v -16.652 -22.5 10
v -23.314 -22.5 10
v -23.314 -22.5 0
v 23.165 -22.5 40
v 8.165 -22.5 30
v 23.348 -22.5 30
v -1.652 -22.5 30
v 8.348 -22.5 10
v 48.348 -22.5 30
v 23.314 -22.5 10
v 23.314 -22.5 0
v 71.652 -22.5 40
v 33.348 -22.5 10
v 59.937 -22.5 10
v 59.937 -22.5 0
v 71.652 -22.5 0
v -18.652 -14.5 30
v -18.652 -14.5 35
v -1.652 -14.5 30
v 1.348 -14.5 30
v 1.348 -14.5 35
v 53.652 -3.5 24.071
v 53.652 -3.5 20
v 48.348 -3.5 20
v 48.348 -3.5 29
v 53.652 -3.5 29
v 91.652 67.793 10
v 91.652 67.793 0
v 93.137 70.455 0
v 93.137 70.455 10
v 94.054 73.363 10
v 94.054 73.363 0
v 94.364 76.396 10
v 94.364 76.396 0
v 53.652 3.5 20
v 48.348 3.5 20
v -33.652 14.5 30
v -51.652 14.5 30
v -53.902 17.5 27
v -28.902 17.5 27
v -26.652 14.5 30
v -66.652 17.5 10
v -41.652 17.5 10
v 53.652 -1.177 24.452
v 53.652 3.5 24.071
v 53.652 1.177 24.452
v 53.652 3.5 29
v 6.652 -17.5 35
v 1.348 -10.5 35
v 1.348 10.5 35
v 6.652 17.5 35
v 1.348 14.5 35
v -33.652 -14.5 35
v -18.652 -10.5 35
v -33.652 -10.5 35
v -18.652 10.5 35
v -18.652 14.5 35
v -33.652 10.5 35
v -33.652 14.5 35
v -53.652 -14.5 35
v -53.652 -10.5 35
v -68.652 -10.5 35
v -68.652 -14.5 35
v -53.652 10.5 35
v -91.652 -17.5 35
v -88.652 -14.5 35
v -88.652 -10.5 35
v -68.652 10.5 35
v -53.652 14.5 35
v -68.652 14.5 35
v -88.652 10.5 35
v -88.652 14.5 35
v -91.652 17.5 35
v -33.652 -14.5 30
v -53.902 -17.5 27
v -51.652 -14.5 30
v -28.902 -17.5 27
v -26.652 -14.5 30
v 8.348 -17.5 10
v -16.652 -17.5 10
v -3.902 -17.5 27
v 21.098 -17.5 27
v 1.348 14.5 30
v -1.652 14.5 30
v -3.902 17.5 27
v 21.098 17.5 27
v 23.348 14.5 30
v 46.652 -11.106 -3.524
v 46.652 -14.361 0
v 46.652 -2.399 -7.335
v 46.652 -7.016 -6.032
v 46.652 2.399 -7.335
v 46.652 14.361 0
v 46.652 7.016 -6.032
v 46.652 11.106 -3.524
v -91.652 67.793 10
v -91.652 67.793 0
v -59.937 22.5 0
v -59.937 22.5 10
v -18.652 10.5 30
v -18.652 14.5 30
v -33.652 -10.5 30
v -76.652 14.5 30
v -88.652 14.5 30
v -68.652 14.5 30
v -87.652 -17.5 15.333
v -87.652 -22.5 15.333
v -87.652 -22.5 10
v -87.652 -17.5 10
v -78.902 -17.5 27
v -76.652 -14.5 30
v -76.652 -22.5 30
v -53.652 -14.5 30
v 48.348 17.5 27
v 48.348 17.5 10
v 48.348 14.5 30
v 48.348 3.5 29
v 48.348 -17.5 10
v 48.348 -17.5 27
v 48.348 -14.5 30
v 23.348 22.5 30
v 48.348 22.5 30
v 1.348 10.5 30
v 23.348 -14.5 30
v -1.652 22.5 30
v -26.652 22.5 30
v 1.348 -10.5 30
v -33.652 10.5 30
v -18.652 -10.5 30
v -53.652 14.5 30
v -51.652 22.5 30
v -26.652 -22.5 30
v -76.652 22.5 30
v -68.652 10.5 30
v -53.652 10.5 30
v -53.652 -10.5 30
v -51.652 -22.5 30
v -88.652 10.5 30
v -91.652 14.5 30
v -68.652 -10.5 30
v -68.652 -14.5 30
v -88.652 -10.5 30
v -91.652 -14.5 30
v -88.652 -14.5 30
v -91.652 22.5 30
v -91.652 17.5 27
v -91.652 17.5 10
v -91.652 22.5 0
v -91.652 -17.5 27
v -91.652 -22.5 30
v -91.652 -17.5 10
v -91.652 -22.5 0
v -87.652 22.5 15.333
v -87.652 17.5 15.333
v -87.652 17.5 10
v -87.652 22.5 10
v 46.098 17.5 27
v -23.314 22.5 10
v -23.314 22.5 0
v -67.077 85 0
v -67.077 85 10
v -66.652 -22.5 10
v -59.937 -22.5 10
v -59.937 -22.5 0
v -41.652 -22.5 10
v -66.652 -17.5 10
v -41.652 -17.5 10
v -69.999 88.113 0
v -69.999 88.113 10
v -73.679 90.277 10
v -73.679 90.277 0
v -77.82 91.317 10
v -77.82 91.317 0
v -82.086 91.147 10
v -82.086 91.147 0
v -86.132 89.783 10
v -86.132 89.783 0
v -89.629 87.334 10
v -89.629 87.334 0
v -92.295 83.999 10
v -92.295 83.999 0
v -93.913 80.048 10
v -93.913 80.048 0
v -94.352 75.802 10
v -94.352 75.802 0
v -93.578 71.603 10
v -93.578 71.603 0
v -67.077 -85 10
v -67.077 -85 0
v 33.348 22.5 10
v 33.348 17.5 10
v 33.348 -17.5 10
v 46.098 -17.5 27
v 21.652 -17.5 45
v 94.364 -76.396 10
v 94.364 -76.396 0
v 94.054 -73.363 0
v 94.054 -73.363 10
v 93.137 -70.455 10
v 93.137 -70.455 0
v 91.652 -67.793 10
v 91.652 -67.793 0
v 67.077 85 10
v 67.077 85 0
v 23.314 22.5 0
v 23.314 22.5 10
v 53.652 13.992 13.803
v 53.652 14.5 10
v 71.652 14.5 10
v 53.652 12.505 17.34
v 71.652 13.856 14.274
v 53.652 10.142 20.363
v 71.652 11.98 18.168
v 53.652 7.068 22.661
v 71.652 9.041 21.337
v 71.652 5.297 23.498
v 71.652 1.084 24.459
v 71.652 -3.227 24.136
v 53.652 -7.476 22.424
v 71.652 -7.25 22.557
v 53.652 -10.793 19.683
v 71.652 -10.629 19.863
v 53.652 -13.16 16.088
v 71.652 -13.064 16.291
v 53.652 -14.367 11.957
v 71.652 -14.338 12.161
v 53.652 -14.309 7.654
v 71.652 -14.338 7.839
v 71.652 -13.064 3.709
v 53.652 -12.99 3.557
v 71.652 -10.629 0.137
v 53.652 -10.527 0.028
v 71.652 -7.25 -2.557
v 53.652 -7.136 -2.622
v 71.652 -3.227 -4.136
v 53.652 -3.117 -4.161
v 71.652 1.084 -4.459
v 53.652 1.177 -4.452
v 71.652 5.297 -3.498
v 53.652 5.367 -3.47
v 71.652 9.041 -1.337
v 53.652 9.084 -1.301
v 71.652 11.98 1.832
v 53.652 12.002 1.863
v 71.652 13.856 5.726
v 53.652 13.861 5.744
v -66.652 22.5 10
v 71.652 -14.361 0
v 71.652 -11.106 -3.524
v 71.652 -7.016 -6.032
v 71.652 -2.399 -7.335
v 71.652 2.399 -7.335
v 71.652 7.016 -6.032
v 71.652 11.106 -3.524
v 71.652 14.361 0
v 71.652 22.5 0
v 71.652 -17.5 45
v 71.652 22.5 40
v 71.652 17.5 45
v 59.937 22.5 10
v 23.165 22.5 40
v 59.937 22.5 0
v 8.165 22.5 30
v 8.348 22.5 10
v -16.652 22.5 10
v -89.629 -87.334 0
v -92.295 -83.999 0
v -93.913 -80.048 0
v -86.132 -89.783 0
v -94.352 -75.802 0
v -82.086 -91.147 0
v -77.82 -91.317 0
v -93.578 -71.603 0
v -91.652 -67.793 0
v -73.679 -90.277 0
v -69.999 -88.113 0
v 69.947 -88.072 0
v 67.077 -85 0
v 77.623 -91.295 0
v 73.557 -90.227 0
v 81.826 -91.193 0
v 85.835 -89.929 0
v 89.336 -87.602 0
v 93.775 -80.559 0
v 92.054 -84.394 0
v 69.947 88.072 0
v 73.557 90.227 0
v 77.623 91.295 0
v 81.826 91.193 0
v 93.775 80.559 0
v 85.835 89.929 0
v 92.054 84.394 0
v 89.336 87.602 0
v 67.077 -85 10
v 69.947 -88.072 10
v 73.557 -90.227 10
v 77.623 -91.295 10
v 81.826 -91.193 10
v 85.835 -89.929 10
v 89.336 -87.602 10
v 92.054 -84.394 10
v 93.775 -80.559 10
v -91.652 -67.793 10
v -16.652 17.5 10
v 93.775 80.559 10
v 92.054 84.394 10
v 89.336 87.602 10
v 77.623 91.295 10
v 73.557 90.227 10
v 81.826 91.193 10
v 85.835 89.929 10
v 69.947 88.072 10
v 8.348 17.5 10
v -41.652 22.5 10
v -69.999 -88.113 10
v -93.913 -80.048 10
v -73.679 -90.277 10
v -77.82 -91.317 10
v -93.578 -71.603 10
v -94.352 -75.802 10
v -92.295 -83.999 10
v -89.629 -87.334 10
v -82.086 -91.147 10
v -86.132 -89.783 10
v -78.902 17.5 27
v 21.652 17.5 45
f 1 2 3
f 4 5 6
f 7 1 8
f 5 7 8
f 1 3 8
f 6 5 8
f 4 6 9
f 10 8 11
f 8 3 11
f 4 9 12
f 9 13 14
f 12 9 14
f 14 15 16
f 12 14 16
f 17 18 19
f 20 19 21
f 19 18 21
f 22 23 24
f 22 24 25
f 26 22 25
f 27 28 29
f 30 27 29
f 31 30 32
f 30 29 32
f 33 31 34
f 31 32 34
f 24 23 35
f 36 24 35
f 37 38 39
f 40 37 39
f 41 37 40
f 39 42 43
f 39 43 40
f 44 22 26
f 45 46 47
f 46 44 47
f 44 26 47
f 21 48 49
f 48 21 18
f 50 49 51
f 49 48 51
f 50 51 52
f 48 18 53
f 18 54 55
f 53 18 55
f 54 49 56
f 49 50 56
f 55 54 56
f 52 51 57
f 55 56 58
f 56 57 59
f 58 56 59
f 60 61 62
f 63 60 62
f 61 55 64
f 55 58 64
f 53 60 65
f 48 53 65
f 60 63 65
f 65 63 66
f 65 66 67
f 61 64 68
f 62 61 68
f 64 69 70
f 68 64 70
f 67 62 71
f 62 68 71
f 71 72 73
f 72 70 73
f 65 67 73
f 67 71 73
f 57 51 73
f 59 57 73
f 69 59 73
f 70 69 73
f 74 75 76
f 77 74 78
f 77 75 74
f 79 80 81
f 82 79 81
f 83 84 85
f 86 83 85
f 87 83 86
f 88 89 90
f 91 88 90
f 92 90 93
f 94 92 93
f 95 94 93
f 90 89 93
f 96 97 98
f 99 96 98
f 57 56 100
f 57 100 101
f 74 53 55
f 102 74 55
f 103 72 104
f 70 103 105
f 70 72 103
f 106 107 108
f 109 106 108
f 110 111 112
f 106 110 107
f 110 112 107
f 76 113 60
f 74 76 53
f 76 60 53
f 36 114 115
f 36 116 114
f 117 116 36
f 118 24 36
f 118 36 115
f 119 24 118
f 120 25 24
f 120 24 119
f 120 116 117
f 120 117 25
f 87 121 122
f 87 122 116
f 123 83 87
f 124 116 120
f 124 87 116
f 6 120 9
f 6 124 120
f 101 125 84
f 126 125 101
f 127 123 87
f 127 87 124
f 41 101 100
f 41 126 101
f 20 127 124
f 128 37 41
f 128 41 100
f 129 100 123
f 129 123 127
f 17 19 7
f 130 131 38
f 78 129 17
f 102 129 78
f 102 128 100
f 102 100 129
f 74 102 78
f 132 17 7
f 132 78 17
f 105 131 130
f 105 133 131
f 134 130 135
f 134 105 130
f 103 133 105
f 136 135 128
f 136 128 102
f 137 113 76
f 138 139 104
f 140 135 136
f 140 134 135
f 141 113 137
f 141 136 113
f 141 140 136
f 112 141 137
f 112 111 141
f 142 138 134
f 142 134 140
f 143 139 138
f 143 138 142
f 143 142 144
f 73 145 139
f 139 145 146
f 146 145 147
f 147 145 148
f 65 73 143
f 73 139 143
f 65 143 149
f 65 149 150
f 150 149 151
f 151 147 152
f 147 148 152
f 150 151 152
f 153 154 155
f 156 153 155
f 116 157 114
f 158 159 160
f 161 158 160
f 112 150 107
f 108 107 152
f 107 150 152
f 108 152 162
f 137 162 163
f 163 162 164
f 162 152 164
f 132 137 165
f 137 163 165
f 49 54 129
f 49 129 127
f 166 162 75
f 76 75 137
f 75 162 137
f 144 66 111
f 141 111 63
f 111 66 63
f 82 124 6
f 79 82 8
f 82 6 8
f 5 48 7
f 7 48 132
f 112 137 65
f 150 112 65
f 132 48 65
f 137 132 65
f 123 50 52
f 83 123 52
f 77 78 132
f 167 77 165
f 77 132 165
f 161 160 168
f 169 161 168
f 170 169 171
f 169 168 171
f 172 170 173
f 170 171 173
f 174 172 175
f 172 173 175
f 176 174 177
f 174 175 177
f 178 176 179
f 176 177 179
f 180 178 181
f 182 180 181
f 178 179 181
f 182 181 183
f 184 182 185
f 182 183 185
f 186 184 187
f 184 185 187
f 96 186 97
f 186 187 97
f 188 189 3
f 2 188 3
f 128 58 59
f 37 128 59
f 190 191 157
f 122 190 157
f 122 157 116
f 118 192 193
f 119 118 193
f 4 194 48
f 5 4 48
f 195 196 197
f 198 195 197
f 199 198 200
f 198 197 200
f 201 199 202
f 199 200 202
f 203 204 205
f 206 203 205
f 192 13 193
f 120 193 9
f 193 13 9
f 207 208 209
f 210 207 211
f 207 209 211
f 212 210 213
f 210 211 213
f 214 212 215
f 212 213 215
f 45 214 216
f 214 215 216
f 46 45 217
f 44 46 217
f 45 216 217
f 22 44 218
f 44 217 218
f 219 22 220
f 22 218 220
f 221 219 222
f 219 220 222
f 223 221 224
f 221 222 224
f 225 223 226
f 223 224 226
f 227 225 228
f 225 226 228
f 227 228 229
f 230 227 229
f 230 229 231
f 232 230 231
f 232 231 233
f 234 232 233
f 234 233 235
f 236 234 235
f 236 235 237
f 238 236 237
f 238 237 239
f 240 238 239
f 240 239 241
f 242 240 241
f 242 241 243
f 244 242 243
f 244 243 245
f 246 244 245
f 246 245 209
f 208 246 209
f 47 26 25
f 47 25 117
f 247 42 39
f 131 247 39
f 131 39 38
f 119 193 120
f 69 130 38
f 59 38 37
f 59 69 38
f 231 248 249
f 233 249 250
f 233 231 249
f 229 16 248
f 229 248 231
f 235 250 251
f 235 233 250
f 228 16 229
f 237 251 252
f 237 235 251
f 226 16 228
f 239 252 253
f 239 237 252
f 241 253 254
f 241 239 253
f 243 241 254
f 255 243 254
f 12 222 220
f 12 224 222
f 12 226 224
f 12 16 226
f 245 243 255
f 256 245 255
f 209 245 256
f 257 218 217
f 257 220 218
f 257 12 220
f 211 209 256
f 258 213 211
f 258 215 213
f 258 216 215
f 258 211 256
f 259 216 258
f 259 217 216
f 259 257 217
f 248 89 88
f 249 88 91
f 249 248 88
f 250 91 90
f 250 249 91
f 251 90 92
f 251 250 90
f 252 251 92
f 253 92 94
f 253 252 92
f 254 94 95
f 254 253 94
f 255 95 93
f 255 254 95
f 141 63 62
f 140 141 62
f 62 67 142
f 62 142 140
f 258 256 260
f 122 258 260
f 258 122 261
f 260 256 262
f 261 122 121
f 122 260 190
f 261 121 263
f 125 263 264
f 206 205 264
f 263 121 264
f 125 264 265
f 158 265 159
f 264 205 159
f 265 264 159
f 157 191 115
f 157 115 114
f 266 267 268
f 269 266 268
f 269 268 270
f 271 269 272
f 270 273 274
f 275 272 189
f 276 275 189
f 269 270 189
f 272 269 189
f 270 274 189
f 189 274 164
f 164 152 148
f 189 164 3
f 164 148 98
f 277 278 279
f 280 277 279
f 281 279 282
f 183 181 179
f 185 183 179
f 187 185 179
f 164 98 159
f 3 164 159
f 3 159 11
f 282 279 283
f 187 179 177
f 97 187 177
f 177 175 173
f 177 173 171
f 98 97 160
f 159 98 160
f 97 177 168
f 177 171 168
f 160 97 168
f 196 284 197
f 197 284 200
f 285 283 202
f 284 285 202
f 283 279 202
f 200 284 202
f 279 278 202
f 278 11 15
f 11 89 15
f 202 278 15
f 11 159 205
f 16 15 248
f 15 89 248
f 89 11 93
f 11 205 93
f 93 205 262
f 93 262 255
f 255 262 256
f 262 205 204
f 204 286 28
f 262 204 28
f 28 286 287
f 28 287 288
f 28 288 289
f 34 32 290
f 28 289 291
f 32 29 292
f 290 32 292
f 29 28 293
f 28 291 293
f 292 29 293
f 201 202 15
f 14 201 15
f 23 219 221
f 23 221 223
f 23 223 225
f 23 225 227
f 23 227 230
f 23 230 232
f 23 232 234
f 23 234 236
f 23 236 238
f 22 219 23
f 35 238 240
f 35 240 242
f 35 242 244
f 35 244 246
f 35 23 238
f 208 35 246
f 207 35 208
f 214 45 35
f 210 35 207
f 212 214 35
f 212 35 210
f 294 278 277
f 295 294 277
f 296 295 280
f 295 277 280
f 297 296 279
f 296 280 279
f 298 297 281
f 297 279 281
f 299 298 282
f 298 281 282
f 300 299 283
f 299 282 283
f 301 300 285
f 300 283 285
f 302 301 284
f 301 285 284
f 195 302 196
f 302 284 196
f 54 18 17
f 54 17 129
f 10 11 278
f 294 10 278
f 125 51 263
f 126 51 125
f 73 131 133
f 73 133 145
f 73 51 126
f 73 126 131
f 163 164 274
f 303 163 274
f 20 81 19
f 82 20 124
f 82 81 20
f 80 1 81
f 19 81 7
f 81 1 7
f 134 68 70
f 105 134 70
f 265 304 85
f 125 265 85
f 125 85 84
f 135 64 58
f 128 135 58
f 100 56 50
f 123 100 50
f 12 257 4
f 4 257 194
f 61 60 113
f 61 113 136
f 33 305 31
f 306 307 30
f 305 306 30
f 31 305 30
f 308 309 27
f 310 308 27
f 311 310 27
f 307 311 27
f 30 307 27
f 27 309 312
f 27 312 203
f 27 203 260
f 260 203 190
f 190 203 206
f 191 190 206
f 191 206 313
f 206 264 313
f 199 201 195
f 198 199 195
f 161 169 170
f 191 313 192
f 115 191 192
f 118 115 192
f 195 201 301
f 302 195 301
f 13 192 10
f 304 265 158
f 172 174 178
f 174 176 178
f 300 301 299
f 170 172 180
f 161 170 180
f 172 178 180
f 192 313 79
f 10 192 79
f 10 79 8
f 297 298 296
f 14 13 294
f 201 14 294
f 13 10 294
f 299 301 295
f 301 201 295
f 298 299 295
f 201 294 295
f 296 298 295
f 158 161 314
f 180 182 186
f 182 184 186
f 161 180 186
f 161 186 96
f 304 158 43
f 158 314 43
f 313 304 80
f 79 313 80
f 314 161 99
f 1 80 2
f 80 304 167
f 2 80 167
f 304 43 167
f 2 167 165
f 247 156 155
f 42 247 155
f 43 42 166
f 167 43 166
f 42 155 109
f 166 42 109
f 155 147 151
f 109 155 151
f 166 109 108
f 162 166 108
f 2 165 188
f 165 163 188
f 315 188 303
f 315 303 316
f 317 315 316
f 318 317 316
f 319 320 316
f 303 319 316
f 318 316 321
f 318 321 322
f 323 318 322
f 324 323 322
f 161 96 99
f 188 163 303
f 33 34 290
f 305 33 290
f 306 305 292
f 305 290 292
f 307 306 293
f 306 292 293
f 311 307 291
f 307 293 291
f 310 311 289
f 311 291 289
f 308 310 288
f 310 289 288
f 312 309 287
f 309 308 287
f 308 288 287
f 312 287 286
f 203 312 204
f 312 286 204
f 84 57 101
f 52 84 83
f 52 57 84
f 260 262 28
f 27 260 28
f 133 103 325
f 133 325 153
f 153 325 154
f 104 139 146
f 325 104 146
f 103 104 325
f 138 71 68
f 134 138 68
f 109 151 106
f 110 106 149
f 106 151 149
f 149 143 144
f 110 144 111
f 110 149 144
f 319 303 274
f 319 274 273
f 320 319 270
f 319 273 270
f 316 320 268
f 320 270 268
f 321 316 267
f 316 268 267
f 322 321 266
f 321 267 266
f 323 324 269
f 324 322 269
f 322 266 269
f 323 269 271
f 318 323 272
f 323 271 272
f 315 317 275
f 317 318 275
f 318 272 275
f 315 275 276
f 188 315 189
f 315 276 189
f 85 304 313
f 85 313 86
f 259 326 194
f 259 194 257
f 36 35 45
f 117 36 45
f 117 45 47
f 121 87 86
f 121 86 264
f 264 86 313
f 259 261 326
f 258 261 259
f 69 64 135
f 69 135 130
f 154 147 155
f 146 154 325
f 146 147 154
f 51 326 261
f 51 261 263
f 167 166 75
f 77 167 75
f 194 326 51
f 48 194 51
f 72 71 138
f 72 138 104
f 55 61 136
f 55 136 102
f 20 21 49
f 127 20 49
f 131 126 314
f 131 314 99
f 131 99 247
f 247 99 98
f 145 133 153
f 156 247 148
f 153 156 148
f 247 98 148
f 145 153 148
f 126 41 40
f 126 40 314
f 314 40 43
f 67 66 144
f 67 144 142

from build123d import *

# Parameters (mm, degrees)
F1_DEPTH  = 45
F2_W      = 216.5675759315
F2_H      = 199.976965785
F2_W_2    = 183.3030277982
F2_H_2    = 45
F3_DEPTH  = 35
F4_W      = 45
F4_H      = 45
F5_DEPTH  = 20
F6_R      = 17.5
F7_DEPTH  = 25
F8_R      = 14.5
F9_DEPTH  = 18
F10_W     = 7
F10_H     = 9
F11_DEPTH = 10
F12_W     = 35
F12_H     = 20
F13_DEPTH = 140
F15_DEPTH = 113.8973534547
F16_SIZE  = 5
F17_SIZE  = 3
F18_W     = 20
F18_H     = 4
F19_DEPTH = 10
F21_DEPTH = 113.8973534547


with BuildPart() as f1:
    # F0 (on Top) → F1 (new body)
    with BuildSketch(Plane.XY):
        Polygon((-91.6515138991, 22.5), (-91.6515138991, -22.5), (-59.9372190952, -22.5), (-23.3139814323, -22.5), (23.3139814323, -22.5), (59.9372190952, -22.5), (91.6515138991, -22.5), (91.6515138991, 22.5), (59.9372190952, 22.5), (23.3139814323, 22.5), (-23.3139814323, 22.5), (-59.9372190952, 22.5), align=None)
        with BuildLine():
            Line((-23.3139814323, -22.5), (-59.9372190952, -22.5))
            Line((-59.9372190952, -22.5), (-91.6515138991, -67.7927069095))
            ThreePointArc((-91.6515138991, -67.7927069095), (-74.8536462422, -62.0905991935), (-64.3642332348, -76.3963534547))
            ThreePointArc((-64.3642332348, -76.3963534547), (-65.0584789736, -80.9069404473), (-67.0769525704, -85))
            Line((-67.0769525704, -85), (-23.3139814323, -22.5))
        make_face()
        with BuildLine():
            ThreePointArc((-64.3642332348, -76.3963534547), (-74.8536462422, -62.0905991935), (-91.6515138991, -67.7927069095))
            Line((-91.6515138991, -67.7927069095), (-67.0769525704, -85))
            ThreePointArc((-67.0769525704, -85), (-65.0584789736, -80.9069404473), (-64.3642332348, -76.3963534547))
        make_face()
        with BuildLine():
            Line((-67.0769525704, -85), (-91.6515138991, -67.7927069095))
            ThreePointArc((-91.6515138991, -67.7927069095), (-87.96787978, -88.6836341191), (-67.0769525704, -85))
        make_face()
        with BuildLine():
            Line((-91.6515138991, 67.7927069095), (-59.9372190952, 22.5))
            Line((-59.9372190952, 22.5), (-23.3139814323, 22.5))
            Line((-23.3139814323, 22.5), (-67.0769525704, 85))
            ThreePointArc((-67.0769525704, 85), (-65.0584789736, 80.9069404473), (-64.3642332348, 76.3963534547))
            ThreePointArc((-64.3642332348, 76.3963534547), (-74.8536462422, 62.0905991935), (-91.6515138991, 67.7927069095))
        make_face()
        with BuildLine():
            Line((59.9372190952, -22.5), (23.3139814323, -22.5))
            Line((23.3139814323, -22.5), (67.0769525704, -85))
            ThreePointArc((67.0769525704, -85), (70.7605866895, -64.1090727904), (91.6515138991, -67.7927069095))
            Line((91.6515138991, -67.7927069095), (59.9372190952, -22.5))
        make_face()
        with BuildLine():
            ThreePointArc((-67.0769525704, 85), (-87.96787978, 88.6836341191), (-91.6515138991, 67.7927069095))
            ThreePointArc((-91.6515138991, 67.7927069095), (-74.8536462422, 62.0905991935), (-64.3642332348, 76.3963534547))
            ThreePointArc((-64.3642332348, 76.3963534547), (-65.0584789736, 80.9069404473), (-67.0769525704, 85))
        make_face()
        with BuildLine():
            ThreePointArc((91.6515138991, -67.7927069095), (70.7605866895, -64.1090727904), (67.0769525704, -85))
            ThreePointArc((67.0769525704, -85), (83.8748202273, -90.702107716), (94.3642332348, -76.3963534547))
            ThreePointArc((94.3642332348, -76.3963534547), (93.669987496, -71.8857664622), (91.6515138991, -67.7927069095))
        make_face()
        with BuildLine():
            Line((67.0769525704, 85), (23.3139814323, 22.5))
            Line((23.3139814323, 22.5), (59.9372190952, 22.5))
            Line((59.9372190952, 22.5), (91.6515138991, 67.7927069095))
            ThreePointArc((91.6515138991, 67.7927069095), (70.7605866895, 64.1090727904), (67.0769525704, 85))
        make_face()
        with BuildLine():
            ThreePointArc((94.3642332348, 76.3963534547), (83.8748202273, 90.702107716), (67.0769525704, 85))
            ThreePointArc((67.0769525704, 85), (70.7605866895, 64.1090727904), (91.6515138991, 67.7927069095))
            ThreePointArc((91.6515138991, 67.7927069095), (93.669987496, 71.8857664622), (94.3642332348, 76.3963534547))
        make_face()
    extrude(amount=F1_DEPTH)

    # F2 (on face) → F3 (cut)
    with BuildSketch(Plane.XY.offset(45)):
        Rectangle(F2_W, F2_H)
        Rectangle(F2_W_2, F2_H_2, mode=Mode.SUBTRACT)
    extrude(amount=-F3_DEPTH, mode=Mode.SUBTRACT)

    # F4 (on face) → F5 (cut)
    with BuildSketch(Plane.YZ.offset(91.6515138991)):
        with Locations((0, 22.5)):
            Rectangle(F4_W, F4_H)
    extrude(amount=-F5_DEPTH, mode=Mode.SUBTRACT)

    # F6 (on face) → F7 (join)
    with BuildSketch(Plane.YZ.offset(71.6515138991)):
        with Locations((0, 10)):
            Circle(F6_R)
    extrude(amount=-F7_DEPTH)

    # F8 (on face) → F9 (cut)
    with BuildSketch(Plane.YZ.offset(71.6515138991)):
        with Locations((0, 10)):
            Circle(F8_R)
    extrude(amount=-F9_DEPTH, mode=Mode.SUBTRACT)

    # F10 (on face) → F11 (cut)
    with BuildSketch(Plane.YZ.offset(53.6515138991)):
        with Locations((0, 24.5)):
            Rectangle(F10_W, F10_H)
    extrude(amount=-F11_DEPTH, mode=Mode.SUBTRACT)

    # F12 (on face) → F13 (cut)
    with BuildSketch(Plane(origin=(-91.6515138991, 0, 0), x_dir=(0, -1, 0), z_dir=(-1, 0, 0))):
        with Locations((0, 20)):
            Rectangle(F12_W, F12_H)
    extrude(amount=-F13_DEPTH, mode=Mode.SUBTRACT)

    # F14 (on face) → F15 (cut, through all)
    with BuildSketch(Plane(origin=(0, 22.5, 0), x_dir=(-1, 0, 0), z_dir=(0, 1, 0))):
        Polygon((-21.6515138991, 69.95960325), (-21.6515138991, 45), (-6.6515138991, 35), (91.6515138991, 35), (106.8655148461, 35), (106.8655148461, 69.95960325), align=None)
    extrude(amount=-F15_DEPTH, mode=Mode.SUBTRACT)

    # F16
    f16_edges = [f1.edges().sort_by_distance(p)[0] for p in [
        (46.651514, 22.5, 45),
        (46.651514, -22.5, 45),
        (14.151514, -22.5, 40),
        (14.151514, 22.5, 40),
        (-42.5, 22.5, 35),
        (-42.5, -22.5, 35),
    ]]
    chamfer(f16_edges, length=F16_SIZE)

    # F17
    f17_edges = [f1.edges().sort_by_distance(p)[0] for p in [
        (-21.651514, 17.5, 30),
        (-21.651514, -17.5, 30),
    ]]
    chamfer(f17_edges, length=F17_SIZE)

    # F18 (on face) → F19 (cut)
    with BuildSketch(Plane.XY.offset(35)):
        with Locations((-78.6515138991, 12.5)):
            Rectangle(F18_W, F18_H)
        with Locations((-43.6515138991, 12.5)):
            Rectangle(F18_W, F18_H)
        with Locations((-8.6515138991, 12.5)):
            Rectangle(F18_W, F18_H)
        with Locations((-78.6515138991, -12.5)):
            Rectangle(F18_W, F18_H)
        with Locations((-8.6515138991, -12.5)):
            Rectangle(F18_W, F18_H)
        with Locations((-43.6515138991, -12.5)):
            Rectangle(F18_W, F18_H)
    extrude(amount=-F19_DEPTH, mode=Mode.SUBTRACT)

    # F20 (on face) → F21 (cut, through all)
    with BuildSketch(Plane.XZ.offset(22.5)):
        Polygon((-51.6515138991, 30), (-76.6515138991, 30), (-87.6515138991, 15.3333333333), (-87.6515138991, 10), (-66.6515138991, 10), align=None)
        Polygon((-1.6515138991, 30), (-26.6515138991, 30), (-41.6515138991, 10), (-23.3139814323, 10), (-16.6515138991, 10), align=None)
        Polygon((48.3484861009, 30), (23.3484861009, 30), (8.3484861009, 10), (23.3139814323, 10), (33.3484861009, 10), align=None)
    extrude(amount=-F21_DEPTH, mode=Mode.SUBTRACT)


solid = f1.part
